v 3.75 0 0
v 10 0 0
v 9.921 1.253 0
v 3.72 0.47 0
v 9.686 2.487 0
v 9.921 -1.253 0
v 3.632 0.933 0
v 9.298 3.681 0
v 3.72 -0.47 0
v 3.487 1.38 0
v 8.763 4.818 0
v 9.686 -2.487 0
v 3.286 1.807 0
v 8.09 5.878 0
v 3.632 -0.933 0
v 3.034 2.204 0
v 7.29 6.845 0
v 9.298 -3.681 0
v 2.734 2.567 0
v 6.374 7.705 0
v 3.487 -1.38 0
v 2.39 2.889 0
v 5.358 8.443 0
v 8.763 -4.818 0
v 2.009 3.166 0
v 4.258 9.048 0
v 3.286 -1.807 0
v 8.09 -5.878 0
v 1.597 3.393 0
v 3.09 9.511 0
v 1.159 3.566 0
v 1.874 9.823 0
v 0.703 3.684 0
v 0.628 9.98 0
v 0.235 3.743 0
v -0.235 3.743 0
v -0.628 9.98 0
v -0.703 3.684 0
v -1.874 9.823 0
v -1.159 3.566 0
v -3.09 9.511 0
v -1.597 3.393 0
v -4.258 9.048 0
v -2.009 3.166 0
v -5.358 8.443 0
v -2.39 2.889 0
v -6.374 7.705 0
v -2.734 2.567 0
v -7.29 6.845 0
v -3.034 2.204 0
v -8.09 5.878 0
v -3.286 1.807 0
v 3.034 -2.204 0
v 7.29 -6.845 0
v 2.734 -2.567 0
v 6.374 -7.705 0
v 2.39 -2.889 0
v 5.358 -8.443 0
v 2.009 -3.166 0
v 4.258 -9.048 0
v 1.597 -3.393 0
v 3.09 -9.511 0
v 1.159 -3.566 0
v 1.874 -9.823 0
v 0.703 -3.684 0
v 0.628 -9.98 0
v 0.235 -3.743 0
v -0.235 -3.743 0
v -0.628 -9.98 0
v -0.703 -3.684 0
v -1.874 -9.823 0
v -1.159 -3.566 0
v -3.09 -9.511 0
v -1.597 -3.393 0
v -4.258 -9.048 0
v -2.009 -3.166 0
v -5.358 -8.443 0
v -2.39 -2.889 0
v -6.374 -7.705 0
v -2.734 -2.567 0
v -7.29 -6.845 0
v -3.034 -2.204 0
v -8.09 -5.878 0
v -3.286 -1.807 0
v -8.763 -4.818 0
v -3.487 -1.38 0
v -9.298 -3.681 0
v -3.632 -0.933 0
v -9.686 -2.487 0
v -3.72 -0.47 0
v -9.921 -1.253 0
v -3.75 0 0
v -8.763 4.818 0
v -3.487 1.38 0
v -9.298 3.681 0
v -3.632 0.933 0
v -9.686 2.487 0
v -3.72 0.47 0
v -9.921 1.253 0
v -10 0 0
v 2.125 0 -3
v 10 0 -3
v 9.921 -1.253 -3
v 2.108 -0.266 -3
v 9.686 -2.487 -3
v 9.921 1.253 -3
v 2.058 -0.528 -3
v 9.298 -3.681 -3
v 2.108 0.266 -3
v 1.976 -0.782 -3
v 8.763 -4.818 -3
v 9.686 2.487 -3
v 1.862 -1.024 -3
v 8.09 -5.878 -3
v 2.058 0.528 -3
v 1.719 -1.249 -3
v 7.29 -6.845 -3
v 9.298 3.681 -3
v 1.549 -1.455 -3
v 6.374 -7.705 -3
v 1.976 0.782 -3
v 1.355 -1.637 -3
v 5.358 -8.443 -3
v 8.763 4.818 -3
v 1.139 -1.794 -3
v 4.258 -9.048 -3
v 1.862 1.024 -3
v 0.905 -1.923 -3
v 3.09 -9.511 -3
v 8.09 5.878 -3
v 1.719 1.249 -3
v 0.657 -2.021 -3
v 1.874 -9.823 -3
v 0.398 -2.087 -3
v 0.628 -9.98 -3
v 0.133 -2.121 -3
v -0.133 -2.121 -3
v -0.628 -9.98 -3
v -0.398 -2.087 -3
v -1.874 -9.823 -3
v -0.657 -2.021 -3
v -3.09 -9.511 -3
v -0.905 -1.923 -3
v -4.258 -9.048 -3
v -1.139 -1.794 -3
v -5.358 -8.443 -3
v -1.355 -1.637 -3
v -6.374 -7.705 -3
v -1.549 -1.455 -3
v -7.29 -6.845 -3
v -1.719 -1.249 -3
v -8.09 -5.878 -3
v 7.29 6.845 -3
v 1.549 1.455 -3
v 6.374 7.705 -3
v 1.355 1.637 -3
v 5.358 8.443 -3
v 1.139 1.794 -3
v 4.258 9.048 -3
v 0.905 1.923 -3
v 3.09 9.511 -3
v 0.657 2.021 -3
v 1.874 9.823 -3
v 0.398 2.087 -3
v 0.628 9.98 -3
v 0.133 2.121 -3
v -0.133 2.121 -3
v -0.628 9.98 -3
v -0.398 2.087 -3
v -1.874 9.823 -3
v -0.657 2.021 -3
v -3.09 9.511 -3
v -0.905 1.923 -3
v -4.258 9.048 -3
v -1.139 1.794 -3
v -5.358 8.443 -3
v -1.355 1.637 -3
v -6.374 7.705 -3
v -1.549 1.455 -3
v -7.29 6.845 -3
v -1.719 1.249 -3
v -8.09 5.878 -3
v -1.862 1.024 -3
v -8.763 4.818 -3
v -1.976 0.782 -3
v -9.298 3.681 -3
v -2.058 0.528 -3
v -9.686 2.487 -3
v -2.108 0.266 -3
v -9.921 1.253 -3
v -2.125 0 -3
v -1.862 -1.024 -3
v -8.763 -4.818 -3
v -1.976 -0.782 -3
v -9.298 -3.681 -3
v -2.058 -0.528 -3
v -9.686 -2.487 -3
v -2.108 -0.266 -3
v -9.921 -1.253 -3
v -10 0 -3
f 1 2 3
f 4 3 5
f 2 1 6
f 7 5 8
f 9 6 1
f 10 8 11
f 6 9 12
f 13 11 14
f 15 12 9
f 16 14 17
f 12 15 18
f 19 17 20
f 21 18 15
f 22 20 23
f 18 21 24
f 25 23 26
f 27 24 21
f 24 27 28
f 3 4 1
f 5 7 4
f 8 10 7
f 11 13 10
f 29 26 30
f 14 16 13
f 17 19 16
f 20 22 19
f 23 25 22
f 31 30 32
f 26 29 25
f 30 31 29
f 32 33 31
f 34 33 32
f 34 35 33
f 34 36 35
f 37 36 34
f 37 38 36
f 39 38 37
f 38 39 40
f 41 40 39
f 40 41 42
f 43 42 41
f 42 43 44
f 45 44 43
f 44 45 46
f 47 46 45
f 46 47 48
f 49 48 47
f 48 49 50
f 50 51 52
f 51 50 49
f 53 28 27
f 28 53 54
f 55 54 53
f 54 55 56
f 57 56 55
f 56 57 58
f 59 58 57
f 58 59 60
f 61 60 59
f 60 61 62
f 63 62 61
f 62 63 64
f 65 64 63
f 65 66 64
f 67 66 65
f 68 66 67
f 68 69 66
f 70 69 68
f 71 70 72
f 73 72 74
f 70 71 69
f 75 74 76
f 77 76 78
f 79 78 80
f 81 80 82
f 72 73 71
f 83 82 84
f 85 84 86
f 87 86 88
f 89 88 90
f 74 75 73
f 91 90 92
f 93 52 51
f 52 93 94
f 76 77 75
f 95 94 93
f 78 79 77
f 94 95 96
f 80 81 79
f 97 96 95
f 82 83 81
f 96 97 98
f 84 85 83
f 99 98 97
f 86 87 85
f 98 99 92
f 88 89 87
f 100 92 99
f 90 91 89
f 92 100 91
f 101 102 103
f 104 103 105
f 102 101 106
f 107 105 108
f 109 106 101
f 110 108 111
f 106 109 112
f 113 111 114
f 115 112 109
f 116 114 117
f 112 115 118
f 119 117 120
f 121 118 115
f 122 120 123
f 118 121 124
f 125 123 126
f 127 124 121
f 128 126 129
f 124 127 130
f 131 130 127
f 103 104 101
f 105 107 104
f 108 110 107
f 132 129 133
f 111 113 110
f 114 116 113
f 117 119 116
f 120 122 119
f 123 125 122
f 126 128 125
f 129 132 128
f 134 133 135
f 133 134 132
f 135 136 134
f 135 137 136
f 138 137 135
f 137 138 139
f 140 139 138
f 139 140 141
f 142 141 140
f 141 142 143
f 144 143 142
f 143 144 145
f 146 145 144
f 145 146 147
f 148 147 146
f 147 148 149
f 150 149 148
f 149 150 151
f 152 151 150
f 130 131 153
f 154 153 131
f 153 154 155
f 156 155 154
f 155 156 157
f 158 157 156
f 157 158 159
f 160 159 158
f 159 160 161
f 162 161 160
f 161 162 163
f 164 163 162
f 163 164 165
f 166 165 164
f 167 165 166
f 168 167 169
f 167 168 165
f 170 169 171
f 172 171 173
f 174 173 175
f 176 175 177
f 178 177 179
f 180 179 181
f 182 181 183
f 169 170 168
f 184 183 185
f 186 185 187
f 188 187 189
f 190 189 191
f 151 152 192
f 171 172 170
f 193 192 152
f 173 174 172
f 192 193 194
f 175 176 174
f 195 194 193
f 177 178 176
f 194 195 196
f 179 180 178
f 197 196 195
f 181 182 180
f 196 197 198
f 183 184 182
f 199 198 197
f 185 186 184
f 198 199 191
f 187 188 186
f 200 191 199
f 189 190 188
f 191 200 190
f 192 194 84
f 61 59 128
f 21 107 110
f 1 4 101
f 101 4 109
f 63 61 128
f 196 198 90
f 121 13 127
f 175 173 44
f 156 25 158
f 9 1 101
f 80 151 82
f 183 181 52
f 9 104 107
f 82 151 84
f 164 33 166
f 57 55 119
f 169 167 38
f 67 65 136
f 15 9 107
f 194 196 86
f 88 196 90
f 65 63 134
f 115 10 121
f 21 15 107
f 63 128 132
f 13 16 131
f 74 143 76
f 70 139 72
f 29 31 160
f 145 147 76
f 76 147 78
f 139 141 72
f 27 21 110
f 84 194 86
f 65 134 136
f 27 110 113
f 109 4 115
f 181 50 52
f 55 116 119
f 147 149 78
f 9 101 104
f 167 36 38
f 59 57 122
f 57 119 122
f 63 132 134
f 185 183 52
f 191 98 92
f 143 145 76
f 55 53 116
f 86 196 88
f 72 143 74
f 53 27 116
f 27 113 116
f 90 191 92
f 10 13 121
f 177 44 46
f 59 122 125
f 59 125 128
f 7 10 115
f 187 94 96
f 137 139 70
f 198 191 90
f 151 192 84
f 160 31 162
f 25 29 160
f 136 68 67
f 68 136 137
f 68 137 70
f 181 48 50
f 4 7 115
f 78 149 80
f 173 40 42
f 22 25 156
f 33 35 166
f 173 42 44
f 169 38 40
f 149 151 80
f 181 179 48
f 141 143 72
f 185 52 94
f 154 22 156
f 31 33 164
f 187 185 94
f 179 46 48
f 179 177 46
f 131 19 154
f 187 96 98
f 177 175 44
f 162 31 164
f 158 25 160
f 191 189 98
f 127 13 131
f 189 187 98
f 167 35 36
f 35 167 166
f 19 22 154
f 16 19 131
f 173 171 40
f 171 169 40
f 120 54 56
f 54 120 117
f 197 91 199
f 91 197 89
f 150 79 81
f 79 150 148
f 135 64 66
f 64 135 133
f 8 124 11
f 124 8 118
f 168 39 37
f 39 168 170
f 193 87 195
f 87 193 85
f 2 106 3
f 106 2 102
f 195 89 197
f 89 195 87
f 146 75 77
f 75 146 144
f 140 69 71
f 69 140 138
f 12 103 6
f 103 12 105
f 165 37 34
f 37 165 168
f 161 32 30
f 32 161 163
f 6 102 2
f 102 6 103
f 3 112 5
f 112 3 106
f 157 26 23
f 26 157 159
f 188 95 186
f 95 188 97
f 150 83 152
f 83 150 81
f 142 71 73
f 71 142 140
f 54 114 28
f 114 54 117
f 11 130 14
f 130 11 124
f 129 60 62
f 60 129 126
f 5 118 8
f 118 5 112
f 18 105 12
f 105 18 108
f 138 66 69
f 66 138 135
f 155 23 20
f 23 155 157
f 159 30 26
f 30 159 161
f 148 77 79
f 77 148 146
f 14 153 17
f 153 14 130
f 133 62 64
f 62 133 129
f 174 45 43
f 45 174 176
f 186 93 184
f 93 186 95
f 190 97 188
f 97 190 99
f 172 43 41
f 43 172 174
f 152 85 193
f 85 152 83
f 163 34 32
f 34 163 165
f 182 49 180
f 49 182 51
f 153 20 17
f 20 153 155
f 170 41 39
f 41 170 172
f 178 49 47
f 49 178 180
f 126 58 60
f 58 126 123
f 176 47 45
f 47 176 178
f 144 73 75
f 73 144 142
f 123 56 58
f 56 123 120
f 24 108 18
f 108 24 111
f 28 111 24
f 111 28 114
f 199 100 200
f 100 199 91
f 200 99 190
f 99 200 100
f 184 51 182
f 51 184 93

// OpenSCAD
$fn = 50;


difference() {
	union() {
		translate(v = [0, 0, -3.0000000000]) {
			cylinder(h = 3, r = 10.0000000000);
		}
		cylinder(h = 0, r = 16.0000000000);
	}
	union() {
		translate(v = [0, 0, 0]) {
			rotate(a = [0, 0, 0]) {
				difference() {
					union() {
						#translate(v = [0, 0, -3.0000000000]) {
							cylinder(h = 3, r = 2.0000000000);
						}
						#translate(v = [0, 0, -3]) {
							cylinder(h = 3, r = 10.0000000000, r1 = 2.1250000000, r2 = 3.7500000000);
						}
						#translate(v = [0, 0, -3.0000000000]) {
							cylinder(h = 3, r = 2.1250000000);
						}
						#translate(v = [0, 0, -3.0000000000]) {
							cylinder(h = 3, r = 2.0000000000);
						}
					}
					union();
				}
			}
		}
	}
}
